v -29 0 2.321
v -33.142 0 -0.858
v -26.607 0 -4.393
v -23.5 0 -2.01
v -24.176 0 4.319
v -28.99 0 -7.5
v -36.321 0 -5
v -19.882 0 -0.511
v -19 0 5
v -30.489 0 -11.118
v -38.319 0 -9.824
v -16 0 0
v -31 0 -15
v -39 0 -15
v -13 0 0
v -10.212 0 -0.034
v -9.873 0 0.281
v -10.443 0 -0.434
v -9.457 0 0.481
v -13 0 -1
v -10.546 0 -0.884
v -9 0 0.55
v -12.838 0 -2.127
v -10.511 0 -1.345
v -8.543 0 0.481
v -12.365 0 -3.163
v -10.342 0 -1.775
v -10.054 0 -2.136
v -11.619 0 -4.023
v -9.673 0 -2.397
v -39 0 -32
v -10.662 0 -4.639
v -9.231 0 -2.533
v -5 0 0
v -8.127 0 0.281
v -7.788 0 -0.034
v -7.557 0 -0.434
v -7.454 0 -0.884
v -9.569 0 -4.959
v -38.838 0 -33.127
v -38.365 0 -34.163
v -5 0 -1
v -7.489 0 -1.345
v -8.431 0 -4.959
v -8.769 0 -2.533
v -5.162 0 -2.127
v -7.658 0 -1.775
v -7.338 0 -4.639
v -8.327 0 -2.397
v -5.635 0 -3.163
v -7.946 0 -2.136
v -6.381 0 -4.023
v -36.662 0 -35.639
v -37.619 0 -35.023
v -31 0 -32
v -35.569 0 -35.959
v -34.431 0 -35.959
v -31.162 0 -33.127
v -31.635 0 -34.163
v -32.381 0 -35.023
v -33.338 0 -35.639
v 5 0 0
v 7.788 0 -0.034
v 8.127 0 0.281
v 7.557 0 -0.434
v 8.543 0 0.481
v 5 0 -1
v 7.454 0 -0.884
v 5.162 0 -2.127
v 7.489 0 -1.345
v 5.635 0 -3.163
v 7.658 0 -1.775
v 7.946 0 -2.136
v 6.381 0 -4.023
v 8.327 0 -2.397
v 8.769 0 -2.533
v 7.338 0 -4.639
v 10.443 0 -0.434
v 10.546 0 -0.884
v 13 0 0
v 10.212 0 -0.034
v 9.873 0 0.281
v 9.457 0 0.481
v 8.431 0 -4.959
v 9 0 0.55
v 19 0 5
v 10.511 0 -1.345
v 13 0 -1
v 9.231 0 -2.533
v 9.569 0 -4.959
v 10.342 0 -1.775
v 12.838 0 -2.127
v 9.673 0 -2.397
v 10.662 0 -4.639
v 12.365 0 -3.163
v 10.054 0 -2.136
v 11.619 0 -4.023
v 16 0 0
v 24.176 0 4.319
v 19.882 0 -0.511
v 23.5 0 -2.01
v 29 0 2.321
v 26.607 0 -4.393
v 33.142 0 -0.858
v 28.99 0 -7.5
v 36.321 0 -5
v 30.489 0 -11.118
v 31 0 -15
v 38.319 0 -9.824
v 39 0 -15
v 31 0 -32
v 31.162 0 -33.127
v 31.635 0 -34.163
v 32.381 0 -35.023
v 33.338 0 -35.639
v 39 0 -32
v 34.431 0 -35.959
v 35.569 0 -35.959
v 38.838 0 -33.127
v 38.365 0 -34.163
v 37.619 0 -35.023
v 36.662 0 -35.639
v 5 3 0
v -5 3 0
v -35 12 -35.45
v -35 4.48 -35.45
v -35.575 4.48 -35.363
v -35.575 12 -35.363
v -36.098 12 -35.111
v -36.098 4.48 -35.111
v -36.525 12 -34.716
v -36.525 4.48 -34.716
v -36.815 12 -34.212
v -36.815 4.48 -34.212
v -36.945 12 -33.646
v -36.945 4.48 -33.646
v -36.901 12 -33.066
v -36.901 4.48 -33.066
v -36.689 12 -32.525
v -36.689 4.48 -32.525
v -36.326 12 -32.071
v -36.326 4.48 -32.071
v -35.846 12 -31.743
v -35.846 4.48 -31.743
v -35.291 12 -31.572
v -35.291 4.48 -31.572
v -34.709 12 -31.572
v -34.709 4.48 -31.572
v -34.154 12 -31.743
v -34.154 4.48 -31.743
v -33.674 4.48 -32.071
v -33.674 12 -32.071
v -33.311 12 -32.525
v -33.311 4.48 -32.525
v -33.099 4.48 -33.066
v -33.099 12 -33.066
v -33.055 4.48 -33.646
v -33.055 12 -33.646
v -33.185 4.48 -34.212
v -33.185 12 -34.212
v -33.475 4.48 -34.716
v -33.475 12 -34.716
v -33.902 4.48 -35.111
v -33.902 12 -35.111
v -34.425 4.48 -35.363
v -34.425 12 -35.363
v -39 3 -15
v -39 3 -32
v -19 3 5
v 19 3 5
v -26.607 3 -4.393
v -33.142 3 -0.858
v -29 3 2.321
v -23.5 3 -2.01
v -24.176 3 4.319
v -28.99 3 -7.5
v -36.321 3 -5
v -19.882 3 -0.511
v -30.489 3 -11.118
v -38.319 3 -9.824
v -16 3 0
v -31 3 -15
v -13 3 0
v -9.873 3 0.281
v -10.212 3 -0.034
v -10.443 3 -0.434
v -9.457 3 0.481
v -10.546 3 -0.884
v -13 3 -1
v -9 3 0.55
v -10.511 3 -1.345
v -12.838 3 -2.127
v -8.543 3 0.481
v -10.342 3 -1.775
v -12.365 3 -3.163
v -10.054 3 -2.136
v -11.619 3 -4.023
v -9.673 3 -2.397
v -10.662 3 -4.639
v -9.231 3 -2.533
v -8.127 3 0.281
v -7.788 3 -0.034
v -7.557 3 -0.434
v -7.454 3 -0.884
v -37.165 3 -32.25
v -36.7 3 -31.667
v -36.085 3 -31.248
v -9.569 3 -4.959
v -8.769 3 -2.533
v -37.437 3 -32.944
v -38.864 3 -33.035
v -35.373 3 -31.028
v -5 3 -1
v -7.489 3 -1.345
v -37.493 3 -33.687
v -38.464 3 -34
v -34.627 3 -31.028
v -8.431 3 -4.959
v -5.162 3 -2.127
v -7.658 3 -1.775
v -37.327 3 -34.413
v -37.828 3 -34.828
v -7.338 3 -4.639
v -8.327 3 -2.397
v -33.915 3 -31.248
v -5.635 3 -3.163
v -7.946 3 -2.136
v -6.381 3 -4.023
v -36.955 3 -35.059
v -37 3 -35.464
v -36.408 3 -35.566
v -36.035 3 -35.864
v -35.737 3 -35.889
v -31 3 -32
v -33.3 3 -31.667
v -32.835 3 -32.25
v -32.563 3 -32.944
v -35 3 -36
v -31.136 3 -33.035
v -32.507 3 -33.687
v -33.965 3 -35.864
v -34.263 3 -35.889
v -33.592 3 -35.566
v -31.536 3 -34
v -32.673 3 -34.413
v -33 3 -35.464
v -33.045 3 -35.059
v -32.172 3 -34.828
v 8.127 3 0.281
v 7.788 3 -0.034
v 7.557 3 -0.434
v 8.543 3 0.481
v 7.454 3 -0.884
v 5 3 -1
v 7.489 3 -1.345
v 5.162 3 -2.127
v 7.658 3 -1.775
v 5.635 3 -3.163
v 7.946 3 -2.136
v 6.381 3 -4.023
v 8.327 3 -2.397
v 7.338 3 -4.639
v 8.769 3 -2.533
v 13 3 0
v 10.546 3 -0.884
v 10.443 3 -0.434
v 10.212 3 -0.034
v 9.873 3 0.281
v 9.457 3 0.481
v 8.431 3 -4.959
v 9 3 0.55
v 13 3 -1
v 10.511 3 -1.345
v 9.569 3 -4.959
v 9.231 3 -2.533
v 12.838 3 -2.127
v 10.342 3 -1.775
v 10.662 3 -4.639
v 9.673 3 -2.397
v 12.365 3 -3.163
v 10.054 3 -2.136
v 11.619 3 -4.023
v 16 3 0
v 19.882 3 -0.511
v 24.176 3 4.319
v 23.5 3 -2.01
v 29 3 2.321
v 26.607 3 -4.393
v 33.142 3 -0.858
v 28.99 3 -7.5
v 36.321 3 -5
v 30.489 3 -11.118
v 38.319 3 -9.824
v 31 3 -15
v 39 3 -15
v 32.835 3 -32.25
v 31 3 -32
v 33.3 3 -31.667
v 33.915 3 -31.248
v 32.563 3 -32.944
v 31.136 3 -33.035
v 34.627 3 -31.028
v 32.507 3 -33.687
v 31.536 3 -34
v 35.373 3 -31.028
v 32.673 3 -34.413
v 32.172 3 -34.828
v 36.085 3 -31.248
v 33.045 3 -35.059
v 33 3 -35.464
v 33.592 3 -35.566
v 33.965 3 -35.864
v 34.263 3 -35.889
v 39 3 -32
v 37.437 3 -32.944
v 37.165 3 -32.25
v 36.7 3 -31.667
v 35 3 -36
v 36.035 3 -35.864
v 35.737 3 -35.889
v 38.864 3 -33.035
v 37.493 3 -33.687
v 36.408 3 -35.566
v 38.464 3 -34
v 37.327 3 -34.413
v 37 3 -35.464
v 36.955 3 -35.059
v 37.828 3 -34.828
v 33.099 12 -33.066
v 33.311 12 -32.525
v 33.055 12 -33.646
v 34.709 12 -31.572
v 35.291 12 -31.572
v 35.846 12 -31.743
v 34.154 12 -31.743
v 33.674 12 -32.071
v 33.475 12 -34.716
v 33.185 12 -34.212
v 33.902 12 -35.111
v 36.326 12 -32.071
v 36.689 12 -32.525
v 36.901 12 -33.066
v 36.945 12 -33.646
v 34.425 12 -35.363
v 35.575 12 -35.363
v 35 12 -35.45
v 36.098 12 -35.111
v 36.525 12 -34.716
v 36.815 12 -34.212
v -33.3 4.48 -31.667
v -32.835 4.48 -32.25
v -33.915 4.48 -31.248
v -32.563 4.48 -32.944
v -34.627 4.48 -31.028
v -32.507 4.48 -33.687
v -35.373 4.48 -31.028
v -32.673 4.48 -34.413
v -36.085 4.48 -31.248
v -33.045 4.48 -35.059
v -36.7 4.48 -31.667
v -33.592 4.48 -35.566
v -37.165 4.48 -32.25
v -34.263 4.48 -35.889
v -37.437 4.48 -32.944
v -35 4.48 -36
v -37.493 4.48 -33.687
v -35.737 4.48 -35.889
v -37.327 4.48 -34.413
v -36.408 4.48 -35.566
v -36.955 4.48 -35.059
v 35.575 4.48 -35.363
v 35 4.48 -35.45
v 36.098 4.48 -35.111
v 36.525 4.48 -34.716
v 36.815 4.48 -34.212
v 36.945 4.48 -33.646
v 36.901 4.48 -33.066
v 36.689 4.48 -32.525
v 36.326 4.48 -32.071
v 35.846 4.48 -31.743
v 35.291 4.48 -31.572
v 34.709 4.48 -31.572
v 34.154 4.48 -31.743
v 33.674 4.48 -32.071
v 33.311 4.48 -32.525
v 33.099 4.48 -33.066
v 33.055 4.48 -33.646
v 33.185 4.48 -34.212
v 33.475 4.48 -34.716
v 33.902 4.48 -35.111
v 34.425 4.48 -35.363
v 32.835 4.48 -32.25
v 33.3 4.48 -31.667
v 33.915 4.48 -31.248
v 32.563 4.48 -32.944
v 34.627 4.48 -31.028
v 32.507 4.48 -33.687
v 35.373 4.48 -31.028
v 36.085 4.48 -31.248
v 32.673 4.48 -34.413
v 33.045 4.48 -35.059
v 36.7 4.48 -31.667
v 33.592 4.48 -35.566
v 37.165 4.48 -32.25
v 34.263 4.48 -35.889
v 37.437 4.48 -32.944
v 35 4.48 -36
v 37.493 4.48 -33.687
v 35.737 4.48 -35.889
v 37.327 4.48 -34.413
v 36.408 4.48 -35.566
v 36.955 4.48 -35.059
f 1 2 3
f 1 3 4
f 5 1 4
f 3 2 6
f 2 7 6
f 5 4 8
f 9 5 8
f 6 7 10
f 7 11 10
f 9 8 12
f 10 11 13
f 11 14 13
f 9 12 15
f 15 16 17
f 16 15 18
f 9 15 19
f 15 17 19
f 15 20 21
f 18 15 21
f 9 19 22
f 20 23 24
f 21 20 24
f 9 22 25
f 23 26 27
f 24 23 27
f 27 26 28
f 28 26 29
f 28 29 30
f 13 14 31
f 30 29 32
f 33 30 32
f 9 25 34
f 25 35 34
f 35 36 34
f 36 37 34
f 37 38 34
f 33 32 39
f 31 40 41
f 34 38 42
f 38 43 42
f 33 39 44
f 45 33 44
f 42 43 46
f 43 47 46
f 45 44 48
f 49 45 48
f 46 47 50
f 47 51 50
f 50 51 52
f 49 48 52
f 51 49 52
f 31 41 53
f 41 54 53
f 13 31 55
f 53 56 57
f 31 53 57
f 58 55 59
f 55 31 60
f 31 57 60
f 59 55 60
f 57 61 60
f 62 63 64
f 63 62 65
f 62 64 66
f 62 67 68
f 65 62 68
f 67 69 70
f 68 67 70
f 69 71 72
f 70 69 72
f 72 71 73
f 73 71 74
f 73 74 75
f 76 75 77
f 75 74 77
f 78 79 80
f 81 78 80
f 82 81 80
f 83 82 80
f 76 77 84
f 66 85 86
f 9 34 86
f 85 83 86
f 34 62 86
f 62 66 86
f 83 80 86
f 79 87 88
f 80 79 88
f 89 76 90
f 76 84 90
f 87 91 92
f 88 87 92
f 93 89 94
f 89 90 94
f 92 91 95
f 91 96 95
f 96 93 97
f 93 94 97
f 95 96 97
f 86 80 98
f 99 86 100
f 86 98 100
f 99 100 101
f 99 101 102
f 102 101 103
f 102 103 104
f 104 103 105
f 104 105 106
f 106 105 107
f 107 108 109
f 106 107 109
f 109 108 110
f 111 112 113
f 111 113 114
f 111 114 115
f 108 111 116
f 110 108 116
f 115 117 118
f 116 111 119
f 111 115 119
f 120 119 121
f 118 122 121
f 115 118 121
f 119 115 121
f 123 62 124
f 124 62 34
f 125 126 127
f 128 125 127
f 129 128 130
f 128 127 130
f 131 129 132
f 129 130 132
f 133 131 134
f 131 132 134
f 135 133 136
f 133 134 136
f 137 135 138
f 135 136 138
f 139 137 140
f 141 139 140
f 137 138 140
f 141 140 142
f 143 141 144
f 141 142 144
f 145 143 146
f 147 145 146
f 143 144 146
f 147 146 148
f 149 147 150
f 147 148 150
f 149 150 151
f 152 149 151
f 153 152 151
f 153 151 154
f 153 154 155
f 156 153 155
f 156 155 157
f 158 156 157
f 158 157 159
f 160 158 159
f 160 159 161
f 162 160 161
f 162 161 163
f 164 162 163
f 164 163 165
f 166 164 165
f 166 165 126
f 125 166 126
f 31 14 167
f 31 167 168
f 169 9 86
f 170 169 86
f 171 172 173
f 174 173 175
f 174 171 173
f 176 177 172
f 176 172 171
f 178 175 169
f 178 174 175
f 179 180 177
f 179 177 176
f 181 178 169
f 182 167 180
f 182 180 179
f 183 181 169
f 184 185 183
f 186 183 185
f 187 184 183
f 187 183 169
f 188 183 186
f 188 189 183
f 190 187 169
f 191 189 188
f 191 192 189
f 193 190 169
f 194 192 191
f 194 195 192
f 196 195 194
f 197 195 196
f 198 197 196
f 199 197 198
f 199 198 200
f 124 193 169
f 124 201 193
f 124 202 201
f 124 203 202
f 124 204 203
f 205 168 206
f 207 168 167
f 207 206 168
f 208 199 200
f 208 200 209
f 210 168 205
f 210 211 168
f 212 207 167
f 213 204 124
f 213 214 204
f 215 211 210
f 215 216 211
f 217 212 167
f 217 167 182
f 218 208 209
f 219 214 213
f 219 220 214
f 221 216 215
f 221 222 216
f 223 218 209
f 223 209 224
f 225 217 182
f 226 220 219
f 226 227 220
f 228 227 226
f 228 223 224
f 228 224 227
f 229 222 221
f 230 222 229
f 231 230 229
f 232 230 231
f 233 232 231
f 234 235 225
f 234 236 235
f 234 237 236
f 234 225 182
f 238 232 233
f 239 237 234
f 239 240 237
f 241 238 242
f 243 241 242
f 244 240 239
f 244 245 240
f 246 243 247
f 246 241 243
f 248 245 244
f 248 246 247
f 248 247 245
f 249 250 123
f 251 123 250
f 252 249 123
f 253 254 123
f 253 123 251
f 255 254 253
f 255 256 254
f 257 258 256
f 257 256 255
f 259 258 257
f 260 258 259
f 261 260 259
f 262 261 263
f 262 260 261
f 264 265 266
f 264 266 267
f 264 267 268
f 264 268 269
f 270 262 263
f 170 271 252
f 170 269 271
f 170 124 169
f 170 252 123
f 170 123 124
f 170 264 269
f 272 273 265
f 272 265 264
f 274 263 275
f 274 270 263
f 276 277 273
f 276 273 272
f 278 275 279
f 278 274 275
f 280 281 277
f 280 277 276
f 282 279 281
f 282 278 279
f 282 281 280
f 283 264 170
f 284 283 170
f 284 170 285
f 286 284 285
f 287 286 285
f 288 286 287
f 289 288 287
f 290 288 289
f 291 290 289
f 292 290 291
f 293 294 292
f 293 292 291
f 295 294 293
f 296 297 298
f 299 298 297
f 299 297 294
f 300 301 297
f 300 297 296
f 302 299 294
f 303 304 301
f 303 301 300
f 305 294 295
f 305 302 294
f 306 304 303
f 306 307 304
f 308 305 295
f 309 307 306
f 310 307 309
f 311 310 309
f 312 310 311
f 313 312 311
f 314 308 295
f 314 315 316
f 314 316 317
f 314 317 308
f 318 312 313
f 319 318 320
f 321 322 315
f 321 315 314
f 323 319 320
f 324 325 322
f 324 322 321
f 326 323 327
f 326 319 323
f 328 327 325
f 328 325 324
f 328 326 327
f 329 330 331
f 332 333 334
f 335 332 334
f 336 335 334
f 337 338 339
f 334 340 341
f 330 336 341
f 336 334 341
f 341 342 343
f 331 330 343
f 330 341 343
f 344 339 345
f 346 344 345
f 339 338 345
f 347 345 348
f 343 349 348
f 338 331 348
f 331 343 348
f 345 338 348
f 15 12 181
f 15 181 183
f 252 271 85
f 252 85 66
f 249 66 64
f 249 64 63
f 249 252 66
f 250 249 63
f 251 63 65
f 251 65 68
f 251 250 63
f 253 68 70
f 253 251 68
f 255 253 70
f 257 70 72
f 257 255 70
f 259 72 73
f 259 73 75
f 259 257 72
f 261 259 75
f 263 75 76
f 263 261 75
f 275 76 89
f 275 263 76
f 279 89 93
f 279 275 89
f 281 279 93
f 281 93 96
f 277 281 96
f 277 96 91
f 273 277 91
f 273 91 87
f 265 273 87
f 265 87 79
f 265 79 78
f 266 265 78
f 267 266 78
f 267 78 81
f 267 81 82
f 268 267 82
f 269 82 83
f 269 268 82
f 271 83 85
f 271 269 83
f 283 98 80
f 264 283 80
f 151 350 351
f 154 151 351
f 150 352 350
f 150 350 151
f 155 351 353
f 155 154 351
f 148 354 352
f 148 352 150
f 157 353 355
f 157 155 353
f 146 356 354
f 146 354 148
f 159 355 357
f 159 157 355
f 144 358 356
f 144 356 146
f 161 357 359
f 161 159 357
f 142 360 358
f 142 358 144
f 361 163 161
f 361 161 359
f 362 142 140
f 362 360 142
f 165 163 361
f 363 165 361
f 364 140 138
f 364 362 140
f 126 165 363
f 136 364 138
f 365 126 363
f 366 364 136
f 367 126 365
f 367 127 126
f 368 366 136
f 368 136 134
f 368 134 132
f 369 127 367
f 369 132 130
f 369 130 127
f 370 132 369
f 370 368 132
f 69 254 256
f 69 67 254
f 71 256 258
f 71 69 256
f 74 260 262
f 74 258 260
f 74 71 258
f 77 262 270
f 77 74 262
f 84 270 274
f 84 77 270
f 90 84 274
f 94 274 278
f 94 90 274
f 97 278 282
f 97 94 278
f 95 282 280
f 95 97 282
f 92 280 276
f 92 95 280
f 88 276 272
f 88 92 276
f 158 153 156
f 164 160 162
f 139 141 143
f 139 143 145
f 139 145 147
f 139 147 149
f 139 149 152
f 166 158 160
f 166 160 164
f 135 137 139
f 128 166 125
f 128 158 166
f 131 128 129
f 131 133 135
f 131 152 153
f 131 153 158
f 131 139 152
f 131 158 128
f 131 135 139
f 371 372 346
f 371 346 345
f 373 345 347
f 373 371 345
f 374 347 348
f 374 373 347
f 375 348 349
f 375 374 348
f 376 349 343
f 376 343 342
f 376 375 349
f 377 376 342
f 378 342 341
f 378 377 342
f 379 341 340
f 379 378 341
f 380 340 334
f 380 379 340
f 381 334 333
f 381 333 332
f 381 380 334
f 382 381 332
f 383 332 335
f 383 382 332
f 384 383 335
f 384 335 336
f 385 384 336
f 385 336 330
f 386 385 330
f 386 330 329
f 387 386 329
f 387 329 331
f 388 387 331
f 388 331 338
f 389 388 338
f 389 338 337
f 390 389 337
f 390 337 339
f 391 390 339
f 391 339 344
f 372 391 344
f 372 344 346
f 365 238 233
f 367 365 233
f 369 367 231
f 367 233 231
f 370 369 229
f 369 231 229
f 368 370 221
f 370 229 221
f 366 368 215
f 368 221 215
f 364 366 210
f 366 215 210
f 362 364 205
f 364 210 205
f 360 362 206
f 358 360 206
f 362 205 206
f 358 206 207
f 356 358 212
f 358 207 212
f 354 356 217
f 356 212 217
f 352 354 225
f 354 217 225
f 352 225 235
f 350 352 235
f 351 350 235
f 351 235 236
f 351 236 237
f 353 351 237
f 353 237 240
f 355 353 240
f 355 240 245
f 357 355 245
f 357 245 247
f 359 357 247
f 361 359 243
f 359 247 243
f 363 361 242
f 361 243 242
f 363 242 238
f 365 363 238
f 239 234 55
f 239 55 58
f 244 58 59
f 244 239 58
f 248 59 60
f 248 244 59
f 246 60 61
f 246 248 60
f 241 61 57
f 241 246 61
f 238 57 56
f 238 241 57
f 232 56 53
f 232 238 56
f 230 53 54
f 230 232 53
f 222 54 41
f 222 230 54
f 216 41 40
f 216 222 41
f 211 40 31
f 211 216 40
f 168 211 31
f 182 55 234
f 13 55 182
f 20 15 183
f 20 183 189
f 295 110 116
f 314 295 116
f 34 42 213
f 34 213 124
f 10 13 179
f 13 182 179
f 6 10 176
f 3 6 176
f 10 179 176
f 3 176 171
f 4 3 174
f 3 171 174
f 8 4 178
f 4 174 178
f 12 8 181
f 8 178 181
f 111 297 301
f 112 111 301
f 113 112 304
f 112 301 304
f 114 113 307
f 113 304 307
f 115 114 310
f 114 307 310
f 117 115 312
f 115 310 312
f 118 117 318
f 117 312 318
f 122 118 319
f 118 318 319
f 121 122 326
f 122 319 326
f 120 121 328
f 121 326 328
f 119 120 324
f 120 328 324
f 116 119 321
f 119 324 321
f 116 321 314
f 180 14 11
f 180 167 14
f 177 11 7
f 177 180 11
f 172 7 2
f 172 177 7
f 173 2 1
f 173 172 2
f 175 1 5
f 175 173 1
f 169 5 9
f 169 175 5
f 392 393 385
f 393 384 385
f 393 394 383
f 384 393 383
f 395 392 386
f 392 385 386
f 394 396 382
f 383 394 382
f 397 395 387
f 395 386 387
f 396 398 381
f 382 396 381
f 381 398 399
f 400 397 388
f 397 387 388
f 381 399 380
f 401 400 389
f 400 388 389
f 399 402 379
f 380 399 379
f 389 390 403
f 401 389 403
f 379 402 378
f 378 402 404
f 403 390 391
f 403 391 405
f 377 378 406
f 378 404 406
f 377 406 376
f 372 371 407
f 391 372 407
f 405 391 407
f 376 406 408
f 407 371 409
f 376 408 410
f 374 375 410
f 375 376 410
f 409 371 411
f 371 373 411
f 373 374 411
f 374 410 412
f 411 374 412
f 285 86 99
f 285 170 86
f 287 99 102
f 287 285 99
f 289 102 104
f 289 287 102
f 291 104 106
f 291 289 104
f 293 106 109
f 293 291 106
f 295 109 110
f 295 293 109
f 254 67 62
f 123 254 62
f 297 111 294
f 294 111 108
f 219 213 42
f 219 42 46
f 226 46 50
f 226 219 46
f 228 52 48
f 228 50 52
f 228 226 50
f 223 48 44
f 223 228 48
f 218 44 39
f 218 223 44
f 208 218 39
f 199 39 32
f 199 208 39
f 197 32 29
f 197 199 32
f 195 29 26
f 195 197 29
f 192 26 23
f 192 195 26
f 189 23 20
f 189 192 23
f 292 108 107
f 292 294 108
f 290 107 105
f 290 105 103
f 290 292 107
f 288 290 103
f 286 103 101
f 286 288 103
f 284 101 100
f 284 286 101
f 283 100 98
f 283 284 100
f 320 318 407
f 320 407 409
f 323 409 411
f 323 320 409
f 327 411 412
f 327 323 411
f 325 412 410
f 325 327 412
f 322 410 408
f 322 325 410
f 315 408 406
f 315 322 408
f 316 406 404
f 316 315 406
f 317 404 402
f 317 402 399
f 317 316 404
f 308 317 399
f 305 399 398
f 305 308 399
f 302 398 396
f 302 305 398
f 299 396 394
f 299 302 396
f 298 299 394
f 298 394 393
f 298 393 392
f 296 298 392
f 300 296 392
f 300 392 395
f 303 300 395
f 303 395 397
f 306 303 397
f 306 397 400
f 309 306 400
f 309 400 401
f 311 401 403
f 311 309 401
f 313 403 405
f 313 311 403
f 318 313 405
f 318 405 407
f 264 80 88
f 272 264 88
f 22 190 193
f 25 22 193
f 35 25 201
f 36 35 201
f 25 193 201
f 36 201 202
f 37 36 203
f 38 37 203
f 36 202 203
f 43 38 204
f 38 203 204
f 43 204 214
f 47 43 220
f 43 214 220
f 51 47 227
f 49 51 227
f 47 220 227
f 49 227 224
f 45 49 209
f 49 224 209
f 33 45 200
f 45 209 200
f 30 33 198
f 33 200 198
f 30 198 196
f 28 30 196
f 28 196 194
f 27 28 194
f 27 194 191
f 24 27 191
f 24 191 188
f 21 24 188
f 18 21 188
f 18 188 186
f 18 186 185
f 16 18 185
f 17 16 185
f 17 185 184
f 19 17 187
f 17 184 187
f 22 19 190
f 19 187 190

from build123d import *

# Parameters (mm, degrees)
EXTRUDE_1_DEPTH     = 3
SKETCH_2_R          = 1.55
CUT_EXTRUDE_1_DEPTH = 3
SKETCH_3_R          = 1.95
EXTRUDE_2_DEPTH     = 9
FILLET_4_RADIUS     = 4
FILLET_4_LENGTH     = 3
FILLET_5_RADIUS     = 4
FILLET_5_LENGTH     = 3
SKETCH_4_R          = 2.5
EXTRUDE_3_DEPTH     = 1.48
FILLET_6_R          = 15
FILLET_7_R          = 20
CUT_EXTRUDE_2_DEPTH = 55.5068803


with BuildPart() as part:
    # 草图1 → 凸台-拉伸1 (new body)
    with BuildSketch(Plane(origin=(0, 0, 0), x_dir=(1, 0, 0), z_dir=(0, 1, 0))):
        Polygon((-39, 37), (-31, 37), (-31, 0), (-13, 0), (-13, 5), (-5, 5), (-5, 0), (0, 0), (0, -5), (-39, -5), align=None)
    extrude_1 = extrude(amount=EXTRUDE_1_DEPTH)

    # 草图2 → 切除-拉伸1 (cut)
    with BuildSketch(Plane(origin=(0, 3, 0), x_dir=(1, 0, 0), z_dir=(0, 1, 0))):
        with Locations(Location((-9, 1, 0), (0, 0, 270))):
            Circle(SKETCH_2_R)
    cut_extrude_1 = extrude(amount=-CUT_EXTRUDE_1_DEPTH, mode=Mode.SUBTRACT)

    # 草图3 → 凸台-拉伸2 (add)
    with BuildSketch(Plane(origin=(0, 3, 0), x_dir=(1, 0, 0), z_dir=(0, 1, 0))):
        with Locations(Location((-35, 33.5, 0), (0, 0, 90))):
            Circle(SKETCH_3_R)
    extrude_2 = extrude(amount=EXTRUDE_2_DEPTH)

    # 镜向1: 凸台-拉伸1, 切除-拉伸1, 凸台-拉伸2 across plane
    add(extrude_1.mirror(Plane(origin=(0, 3, 0), x_dir=(0, 0, 1), z_dir=(-1, 0, 0))))
    add(cut_extrude_1.mirror(Plane(origin=(0, 3, 0), x_dir=(0, 0, 1), z_dir=(-1, 0, 0))), mode=Mode.SUBTRACT)
    add(extrude_2.mirror(Plane(origin=(0, 3, 0), x_dir=(0, 0, 1), z_dir=(-1, 0, 0))))

    # 圆角4: full round fillet: the end face becomes a half cylinder, R = half its width
    fillet_4_face = Plane((-9, 1.5, -5), x_dir=(0, 1, 0), z_dir=(0, 0, -1))  # on the end face: x along it, z out of the body
    fillet_4_slab = fillet_4_face.offset(-FILLET_4_RADIUS / 2) * Box(FILLET_4_LENGTH, 2 * FILLET_4_RADIUS, FILLET_4_RADIUS, mode=Mode.PRIVATE)  # the body's end, R deep
    fillet_4_round = Plane((-9, 1.5, -1), x_dir=(0, 0, -1), z_dir=(0, 1, 0)) * Cylinder(FILLET_4_RADIUS, FILLET_4_LENGTH, mode=Mode.PRIVATE)  # its axis R under the face
    add(fillet_4_slab - fillet_4_round, mode=Mode.SUBTRACT)

    # 圆角5: full round fillet: the end face becomes a half cylinder, R = half its width
    fillet_5_face = Plane((9, 1.5, -5), x_dir=(0, -1, 0), z_dir=(0, 0, -1))  # on the end face: x along it, z out of the body
    fillet_5_slab = fillet_5_face.offset(-FILLET_5_RADIUS / 2) * Box(FILLET_5_LENGTH, 2 * FILLET_5_RADIUS, FILLET_5_RADIUS, mode=Mode.PRIVATE)  # the body's end, R deep
    fillet_5_round = Plane((9, 1.5, -1), x_dir=(0, 0, -1), z_dir=(0, -1, 0)) * Cylinder(FILLET_5_RADIUS, FILLET_5_LENGTH, mode=Mode.PRIVATE)  # its axis R under the face
    add(fillet_5_slab - fillet_5_round, mode=Mode.SUBTRACT)

    # 草图4 → 凸台-拉伸3 (add)
    with BuildSketch(Plane(origin=(0, 3, 0), x_dir=(1, 0, 0), z_dir=(0, 1, 0))):
        with Locations(Location((-35, 33.5, 0), (0, 0, 90))):
            Circle(SKETCH_4_R)
    extrude_3 = extrude(amount=EXTRUDE_3_DEPTH)

    # 镜向2: 凸台-拉伸3 across plane
    add(extrude_3.mirror(Plane(origin=(0, 0, 0), x_dir=(0, 0, 1), z_dir=(1, 0, 0))))

    # 圆角6
    fillet_6_edges = [part.edges().sort_by_distance(p)[0] for p in [
        (-31, 1.5, 0),
        (31, 1.5, 0),
    ]]
    fillet(fillet_6_edges, radius=FILLET_6_R)

    # 圆角7
    fillet_7_edges = [part.edges().sort_by_distance(p)[0] for p in [
        (-39, 1.5, 5),
        (39, 1.5, 5),
    ]]
    fillet(fillet_7_edges, radius=FILLET_7_R)

    # 草图5 → 切除-拉伸2 (cut, through all)
    with BuildSketch(Plane(origin=(0, 3, 0), x_dir=(1, 0, 0), z_dir=(0, 1, 0))):
        with BuildLine():
            Line((-39, 32), (-39, 37))
            Line((-39, 37), (-31, 37))
            Line((-31, 37), (-31, 32))
            ThreePointArc((-31, 32), (-35, 36), (-39, 32))
        make_face()
    cut_extrude_2 = extrude(amount=-CUT_EXTRUDE_2_DEPTH, mode=Mode.SUBTRACT)

    # 镜向3: 切除-拉伸2 across plane
    add(cut_extrude_2.mirror(Plane(origin=(0, 0, 0), x_dir=(0, 0, 1), z_dir=(1, 0, 0))), mode=Mode.SUBTRACT)


solid = part.part
